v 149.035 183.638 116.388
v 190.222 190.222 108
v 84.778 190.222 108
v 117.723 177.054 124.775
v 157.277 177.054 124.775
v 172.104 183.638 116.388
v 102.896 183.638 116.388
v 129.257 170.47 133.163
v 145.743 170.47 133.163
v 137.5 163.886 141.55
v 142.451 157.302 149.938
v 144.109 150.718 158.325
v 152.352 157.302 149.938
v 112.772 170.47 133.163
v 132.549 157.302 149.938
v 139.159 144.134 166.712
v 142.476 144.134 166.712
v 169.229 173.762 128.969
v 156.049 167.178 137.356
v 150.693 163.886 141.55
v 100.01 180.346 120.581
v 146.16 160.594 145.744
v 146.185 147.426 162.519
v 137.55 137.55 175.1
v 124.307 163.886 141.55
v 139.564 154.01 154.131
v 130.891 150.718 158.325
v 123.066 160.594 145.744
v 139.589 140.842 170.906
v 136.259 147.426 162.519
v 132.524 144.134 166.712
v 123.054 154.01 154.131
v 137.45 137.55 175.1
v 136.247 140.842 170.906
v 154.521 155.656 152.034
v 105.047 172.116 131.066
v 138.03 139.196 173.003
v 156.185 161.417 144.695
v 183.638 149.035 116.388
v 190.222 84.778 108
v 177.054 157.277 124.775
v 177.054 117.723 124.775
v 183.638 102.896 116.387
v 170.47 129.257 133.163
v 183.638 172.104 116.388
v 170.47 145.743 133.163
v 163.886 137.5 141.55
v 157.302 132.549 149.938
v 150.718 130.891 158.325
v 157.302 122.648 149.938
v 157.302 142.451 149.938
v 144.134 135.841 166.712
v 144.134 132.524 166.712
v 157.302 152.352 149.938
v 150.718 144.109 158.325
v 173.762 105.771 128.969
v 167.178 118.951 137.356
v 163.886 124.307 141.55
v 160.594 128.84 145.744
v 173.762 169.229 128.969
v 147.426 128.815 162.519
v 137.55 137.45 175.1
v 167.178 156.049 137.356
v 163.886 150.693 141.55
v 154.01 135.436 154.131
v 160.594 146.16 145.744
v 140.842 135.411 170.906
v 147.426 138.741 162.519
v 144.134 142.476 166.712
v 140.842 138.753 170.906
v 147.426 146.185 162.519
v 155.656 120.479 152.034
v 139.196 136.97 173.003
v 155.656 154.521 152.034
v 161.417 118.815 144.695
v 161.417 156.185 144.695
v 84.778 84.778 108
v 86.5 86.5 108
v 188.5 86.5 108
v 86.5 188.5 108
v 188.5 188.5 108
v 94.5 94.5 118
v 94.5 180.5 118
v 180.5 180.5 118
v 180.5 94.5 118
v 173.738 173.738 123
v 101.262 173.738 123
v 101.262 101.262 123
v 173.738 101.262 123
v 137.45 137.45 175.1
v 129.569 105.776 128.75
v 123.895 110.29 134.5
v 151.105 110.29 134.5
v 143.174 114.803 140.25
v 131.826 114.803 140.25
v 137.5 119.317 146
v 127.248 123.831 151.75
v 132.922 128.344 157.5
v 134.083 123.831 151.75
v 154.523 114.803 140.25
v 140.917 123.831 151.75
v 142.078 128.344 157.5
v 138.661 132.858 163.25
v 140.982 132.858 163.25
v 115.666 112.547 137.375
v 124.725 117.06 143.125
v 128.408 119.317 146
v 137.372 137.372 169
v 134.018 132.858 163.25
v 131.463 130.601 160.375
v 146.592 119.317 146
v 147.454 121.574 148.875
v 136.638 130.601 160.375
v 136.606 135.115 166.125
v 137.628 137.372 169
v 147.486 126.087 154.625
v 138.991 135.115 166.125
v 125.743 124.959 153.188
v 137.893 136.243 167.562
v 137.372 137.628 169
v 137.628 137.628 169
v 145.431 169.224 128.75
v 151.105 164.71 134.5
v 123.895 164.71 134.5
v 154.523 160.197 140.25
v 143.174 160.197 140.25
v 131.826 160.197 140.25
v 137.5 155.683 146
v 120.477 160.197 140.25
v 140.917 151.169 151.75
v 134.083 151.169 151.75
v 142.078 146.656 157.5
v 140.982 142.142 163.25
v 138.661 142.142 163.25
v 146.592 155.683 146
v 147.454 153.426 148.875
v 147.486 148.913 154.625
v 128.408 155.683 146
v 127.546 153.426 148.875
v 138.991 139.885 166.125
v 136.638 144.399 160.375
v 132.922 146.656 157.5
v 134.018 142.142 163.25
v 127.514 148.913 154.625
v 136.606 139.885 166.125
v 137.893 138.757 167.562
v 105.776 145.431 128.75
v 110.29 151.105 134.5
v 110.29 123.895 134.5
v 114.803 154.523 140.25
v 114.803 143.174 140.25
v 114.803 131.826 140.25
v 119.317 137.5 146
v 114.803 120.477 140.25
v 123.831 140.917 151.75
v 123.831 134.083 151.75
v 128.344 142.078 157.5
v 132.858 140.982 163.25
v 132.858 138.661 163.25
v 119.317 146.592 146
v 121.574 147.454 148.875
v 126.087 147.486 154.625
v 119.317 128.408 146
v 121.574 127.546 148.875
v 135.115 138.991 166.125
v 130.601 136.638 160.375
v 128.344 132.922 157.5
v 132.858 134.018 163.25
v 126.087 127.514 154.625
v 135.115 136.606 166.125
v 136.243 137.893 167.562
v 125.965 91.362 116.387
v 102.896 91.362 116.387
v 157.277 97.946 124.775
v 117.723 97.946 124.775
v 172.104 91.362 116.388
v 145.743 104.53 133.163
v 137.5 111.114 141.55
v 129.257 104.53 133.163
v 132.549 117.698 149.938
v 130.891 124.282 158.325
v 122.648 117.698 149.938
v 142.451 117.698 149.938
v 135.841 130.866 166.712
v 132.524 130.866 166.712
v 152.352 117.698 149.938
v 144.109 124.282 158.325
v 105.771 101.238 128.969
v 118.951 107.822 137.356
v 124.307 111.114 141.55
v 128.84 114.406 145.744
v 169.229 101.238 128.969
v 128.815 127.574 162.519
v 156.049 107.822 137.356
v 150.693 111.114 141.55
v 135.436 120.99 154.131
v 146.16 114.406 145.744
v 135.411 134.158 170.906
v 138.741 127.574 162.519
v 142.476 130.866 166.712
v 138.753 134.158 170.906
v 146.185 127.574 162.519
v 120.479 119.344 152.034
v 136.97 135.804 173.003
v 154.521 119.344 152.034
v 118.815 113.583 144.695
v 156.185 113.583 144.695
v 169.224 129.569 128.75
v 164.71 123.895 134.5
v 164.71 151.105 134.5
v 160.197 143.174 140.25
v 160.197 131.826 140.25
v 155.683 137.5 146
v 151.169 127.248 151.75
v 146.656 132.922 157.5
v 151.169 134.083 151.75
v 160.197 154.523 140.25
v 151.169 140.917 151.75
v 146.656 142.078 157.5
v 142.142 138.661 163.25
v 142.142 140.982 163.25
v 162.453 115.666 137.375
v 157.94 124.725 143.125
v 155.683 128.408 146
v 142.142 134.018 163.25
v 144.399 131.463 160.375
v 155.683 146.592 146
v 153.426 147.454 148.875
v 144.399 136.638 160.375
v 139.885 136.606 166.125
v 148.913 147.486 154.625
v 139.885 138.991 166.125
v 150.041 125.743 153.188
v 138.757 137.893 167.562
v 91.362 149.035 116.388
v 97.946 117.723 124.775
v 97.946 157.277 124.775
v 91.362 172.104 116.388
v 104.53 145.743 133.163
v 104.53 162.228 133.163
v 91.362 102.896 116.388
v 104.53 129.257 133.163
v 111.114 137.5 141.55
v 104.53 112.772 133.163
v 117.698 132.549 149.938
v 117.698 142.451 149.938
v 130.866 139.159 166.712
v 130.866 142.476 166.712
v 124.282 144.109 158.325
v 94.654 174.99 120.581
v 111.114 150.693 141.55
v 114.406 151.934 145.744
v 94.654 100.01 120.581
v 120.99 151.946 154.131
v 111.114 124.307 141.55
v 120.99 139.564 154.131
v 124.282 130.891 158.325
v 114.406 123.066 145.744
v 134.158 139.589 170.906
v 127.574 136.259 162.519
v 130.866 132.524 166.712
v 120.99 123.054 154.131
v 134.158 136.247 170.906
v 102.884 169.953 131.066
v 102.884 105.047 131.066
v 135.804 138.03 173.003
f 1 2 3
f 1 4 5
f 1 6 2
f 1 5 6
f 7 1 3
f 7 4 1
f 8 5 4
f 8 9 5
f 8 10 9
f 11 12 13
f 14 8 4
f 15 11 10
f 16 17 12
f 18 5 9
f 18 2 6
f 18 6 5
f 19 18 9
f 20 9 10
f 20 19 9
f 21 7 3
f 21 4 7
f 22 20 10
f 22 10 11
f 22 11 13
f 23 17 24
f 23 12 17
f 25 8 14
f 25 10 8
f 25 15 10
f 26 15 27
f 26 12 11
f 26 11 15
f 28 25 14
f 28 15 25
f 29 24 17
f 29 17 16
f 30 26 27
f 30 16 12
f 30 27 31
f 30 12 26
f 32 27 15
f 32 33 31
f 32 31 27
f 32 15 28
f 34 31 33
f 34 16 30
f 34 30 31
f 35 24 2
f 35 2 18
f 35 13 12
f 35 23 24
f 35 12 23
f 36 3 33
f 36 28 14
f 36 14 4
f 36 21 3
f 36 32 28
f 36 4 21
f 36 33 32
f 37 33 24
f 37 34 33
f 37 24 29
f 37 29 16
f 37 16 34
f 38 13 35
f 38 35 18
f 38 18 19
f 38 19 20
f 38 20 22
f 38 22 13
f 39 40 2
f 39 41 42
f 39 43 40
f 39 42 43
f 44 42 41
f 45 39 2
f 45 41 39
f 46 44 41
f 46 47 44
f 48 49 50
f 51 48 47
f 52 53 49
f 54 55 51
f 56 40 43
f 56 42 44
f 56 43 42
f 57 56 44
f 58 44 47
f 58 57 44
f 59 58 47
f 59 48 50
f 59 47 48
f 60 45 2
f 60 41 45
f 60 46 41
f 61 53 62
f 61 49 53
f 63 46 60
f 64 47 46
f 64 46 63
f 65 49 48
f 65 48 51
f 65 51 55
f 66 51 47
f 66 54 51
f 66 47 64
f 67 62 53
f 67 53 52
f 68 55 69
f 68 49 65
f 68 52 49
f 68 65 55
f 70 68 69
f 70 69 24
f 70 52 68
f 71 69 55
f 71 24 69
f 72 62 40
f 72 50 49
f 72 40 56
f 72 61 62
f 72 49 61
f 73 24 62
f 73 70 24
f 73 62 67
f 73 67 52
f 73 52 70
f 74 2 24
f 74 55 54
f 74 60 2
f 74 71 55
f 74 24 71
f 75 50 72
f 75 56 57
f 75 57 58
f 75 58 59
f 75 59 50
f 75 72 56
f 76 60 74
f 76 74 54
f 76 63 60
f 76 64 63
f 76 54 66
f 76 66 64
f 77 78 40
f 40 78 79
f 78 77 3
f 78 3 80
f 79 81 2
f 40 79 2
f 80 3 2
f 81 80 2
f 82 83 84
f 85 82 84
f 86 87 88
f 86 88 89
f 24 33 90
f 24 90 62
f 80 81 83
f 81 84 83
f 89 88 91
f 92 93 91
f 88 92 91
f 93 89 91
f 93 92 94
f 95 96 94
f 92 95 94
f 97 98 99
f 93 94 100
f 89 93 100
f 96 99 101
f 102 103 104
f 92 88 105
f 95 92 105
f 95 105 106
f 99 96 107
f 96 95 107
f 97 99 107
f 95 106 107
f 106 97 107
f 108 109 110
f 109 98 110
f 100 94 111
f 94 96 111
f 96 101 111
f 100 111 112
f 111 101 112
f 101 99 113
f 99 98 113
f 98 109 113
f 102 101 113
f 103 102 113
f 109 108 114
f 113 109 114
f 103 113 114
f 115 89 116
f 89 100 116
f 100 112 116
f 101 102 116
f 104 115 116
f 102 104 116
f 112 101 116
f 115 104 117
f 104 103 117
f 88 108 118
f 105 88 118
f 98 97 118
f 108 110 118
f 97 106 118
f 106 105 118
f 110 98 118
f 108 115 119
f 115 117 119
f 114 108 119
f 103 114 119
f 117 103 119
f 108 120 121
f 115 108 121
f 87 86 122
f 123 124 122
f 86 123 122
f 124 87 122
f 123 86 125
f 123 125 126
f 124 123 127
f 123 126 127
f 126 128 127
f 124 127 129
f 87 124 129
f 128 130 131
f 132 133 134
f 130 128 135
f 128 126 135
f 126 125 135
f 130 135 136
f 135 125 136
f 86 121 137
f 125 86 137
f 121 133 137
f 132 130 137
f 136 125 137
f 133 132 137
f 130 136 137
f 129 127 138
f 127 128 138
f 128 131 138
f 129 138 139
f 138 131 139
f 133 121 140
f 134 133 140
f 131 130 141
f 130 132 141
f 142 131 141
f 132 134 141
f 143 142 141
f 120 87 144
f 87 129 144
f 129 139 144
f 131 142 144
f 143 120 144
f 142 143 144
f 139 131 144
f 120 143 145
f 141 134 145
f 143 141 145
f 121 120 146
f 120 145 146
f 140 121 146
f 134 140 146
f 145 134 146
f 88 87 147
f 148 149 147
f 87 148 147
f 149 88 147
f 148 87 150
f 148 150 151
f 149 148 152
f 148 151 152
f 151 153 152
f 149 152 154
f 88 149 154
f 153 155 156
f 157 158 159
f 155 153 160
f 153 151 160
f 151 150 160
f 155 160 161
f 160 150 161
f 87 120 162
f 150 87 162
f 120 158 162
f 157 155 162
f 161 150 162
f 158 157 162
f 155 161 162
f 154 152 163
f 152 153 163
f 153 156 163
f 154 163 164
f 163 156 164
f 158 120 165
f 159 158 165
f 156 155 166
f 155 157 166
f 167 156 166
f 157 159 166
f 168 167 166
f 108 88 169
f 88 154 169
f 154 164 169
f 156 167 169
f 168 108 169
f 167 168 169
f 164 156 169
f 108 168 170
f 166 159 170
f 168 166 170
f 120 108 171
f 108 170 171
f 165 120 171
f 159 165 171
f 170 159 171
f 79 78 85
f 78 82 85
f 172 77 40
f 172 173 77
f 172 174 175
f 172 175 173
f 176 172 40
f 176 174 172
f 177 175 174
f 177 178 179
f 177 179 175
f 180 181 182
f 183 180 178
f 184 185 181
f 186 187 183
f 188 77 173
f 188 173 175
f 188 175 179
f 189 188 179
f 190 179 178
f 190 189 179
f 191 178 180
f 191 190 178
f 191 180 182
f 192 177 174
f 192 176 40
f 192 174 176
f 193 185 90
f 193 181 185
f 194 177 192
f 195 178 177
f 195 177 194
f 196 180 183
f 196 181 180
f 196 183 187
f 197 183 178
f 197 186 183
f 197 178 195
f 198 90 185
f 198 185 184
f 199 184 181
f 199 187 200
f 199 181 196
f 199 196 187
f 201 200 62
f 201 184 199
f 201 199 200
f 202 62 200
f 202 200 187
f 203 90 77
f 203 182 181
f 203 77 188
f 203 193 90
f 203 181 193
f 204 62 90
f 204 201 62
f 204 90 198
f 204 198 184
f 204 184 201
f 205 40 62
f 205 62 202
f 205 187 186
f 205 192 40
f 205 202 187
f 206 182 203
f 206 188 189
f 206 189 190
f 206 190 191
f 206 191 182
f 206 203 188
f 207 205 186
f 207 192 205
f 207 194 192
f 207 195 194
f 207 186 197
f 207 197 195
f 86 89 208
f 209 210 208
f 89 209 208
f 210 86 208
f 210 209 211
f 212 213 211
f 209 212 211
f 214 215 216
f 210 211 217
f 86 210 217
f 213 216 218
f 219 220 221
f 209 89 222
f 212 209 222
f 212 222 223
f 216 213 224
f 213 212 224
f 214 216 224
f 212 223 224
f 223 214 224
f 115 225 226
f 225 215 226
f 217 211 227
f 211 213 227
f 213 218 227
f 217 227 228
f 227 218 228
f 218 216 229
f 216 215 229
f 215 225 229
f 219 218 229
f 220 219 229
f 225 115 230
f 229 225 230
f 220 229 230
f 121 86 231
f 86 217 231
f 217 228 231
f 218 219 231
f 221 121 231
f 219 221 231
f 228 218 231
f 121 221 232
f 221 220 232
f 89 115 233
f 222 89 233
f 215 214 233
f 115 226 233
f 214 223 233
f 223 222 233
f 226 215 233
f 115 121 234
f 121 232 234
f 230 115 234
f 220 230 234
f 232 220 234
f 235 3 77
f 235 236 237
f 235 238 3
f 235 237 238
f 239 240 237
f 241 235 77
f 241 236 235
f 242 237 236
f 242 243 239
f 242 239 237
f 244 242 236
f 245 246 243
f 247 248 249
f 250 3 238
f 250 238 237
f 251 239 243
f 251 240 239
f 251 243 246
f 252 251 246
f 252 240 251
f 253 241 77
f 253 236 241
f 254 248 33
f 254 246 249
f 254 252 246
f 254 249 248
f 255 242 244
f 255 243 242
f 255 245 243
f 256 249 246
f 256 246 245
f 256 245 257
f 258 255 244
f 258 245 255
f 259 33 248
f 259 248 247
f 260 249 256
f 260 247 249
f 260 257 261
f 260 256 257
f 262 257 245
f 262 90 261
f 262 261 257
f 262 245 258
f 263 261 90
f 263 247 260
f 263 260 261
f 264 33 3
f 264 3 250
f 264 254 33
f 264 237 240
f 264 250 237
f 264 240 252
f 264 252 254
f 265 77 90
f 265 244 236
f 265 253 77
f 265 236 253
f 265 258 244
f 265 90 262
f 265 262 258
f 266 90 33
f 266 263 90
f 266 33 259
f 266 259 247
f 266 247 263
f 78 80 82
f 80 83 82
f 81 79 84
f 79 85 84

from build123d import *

# Parameters (mm, degrees)
BOX016_W     = 275
BOX016_H     = 275
BOX016_DEPTH = 59
SKETCH050_W  = 102
SKETCH050_H  = 102
SKETCH051_W  = 86
SKETCH051_H  = 86
BOX017_W     = 275
BOX017_H     = 275
BOX017_DEPTH = 46
SKETCH044_W  = 275
SKETCH044_H  = 275
SKETCH045_W  = 0.1
SKETCH045_H  = 0.1
SKETCH038_W  = 275
SKETCH038_H  = 275
SKETCH039_W  = 0.1
SKETCH039_H  = 0.1
BOX010_W     = 275
BOX010_H     = 275
BOX010_DEPTH = 70


with BuildPart() as layer0keep007:
    # Box016 → Box016 (new body)
    with BuildSketch(Plane.XY.offset(48)):
        with Locations((137.5, 137.5)):
            Rectangle(BOX016_W, BOX016_H)
    extrude(amount=BOX016_DEPTH)


with BuildPart() as layertwocut001:
    # Sketch050 → Loft017 section 0
    with BuildSketch(Plane.XY.offset(107)):
        with Locations((137.5, 137.5)):
            Rectangle(SKETCH050_W, SKETCH050_H)
    # Sketch051 → Loft017 section 1
    with BuildSketch(Plane.XY.offset(117)):
        with Locations((137.5, 137.5)):
            Rectangle(SKETCH051_W, SKETCH051_H)
    loft()

    # Fusion021: union layer0Keep007
    add(layer0keep007.part)


with BuildPart() as layertwocut001_1:
    # Fusion021 placement: moved
    add(layertwocut001.part.moved(Location((0, 0, 1))))


with BuildPart() as layer2cut:
    # Box017 → Box017 (new body)
    with BuildSketch(Plane.XY.offset(123)):
        with Locations((137.5, 137.5)):
            Rectangle(BOX017_W, BOX017_H)
    extrude(amount=BOX017_DEPTH)


with BuildPart() as fusion022:
    # Sketch044 → Loft014 section 0
    with BuildSketch(Plane.XY):
        with Locations((137.5, 137.5)):
            Rectangle(SKETCH044_W, SKETCH044_H)
    # Sketch045 → Loft014 section 1
    with BuildSketch(Plane.XY.offset(175.1)):
        with Locations((137.5, 137.5)):
            Rectangle(SKETCH045_W, SKETCH045_H)
    loft()


with BuildPart() as fusion022_1:
    # Loft014 placement: moved
    add(fusion022.part.moved(Location((0, 0, -6))))

    # Common011: intersect layer2Cut
    add(layer2cut.part, mode=Mode.INTERSECT)

    # Fusion022: union layerTwoCut001
    add(layertwocut001_1.part)


with BuildPart() as outerlayer008:
    # Sketch038 → Loft011 section 0
    with BuildSketch(Plane.XY):
        with Locations((137.5, 137.5)):
            Rectangle(SKETCH038_W, SKETCH038_H)
    # Sketch039 → Loft011 section 1
    with BuildSketch(Plane.XY.offset(175.1)):
        with Locations((137.5, 137.5)):
            Rectangle(SKETCH039_W, SKETCH039_H)
    loft()


with BuildPart() as layer2:
    # Box010 → Box010 (new body)
    with BuildSketch(Plane.XY.offset(108)):
        with Locations((137.5, 137.5)):
            Rectangle(BOX010_W, BOX010_H)
    extrude(amount=BOX010_DEPTH)

    # Common010: intersect outerLayer008
    add(outerlayer008.part, mode=Mode.INTERSECT)

    # Cut004: cut Fusion022
    add(fusion022_1.part, mode=Mode.SUBTRACT)


solid = layer2.part
